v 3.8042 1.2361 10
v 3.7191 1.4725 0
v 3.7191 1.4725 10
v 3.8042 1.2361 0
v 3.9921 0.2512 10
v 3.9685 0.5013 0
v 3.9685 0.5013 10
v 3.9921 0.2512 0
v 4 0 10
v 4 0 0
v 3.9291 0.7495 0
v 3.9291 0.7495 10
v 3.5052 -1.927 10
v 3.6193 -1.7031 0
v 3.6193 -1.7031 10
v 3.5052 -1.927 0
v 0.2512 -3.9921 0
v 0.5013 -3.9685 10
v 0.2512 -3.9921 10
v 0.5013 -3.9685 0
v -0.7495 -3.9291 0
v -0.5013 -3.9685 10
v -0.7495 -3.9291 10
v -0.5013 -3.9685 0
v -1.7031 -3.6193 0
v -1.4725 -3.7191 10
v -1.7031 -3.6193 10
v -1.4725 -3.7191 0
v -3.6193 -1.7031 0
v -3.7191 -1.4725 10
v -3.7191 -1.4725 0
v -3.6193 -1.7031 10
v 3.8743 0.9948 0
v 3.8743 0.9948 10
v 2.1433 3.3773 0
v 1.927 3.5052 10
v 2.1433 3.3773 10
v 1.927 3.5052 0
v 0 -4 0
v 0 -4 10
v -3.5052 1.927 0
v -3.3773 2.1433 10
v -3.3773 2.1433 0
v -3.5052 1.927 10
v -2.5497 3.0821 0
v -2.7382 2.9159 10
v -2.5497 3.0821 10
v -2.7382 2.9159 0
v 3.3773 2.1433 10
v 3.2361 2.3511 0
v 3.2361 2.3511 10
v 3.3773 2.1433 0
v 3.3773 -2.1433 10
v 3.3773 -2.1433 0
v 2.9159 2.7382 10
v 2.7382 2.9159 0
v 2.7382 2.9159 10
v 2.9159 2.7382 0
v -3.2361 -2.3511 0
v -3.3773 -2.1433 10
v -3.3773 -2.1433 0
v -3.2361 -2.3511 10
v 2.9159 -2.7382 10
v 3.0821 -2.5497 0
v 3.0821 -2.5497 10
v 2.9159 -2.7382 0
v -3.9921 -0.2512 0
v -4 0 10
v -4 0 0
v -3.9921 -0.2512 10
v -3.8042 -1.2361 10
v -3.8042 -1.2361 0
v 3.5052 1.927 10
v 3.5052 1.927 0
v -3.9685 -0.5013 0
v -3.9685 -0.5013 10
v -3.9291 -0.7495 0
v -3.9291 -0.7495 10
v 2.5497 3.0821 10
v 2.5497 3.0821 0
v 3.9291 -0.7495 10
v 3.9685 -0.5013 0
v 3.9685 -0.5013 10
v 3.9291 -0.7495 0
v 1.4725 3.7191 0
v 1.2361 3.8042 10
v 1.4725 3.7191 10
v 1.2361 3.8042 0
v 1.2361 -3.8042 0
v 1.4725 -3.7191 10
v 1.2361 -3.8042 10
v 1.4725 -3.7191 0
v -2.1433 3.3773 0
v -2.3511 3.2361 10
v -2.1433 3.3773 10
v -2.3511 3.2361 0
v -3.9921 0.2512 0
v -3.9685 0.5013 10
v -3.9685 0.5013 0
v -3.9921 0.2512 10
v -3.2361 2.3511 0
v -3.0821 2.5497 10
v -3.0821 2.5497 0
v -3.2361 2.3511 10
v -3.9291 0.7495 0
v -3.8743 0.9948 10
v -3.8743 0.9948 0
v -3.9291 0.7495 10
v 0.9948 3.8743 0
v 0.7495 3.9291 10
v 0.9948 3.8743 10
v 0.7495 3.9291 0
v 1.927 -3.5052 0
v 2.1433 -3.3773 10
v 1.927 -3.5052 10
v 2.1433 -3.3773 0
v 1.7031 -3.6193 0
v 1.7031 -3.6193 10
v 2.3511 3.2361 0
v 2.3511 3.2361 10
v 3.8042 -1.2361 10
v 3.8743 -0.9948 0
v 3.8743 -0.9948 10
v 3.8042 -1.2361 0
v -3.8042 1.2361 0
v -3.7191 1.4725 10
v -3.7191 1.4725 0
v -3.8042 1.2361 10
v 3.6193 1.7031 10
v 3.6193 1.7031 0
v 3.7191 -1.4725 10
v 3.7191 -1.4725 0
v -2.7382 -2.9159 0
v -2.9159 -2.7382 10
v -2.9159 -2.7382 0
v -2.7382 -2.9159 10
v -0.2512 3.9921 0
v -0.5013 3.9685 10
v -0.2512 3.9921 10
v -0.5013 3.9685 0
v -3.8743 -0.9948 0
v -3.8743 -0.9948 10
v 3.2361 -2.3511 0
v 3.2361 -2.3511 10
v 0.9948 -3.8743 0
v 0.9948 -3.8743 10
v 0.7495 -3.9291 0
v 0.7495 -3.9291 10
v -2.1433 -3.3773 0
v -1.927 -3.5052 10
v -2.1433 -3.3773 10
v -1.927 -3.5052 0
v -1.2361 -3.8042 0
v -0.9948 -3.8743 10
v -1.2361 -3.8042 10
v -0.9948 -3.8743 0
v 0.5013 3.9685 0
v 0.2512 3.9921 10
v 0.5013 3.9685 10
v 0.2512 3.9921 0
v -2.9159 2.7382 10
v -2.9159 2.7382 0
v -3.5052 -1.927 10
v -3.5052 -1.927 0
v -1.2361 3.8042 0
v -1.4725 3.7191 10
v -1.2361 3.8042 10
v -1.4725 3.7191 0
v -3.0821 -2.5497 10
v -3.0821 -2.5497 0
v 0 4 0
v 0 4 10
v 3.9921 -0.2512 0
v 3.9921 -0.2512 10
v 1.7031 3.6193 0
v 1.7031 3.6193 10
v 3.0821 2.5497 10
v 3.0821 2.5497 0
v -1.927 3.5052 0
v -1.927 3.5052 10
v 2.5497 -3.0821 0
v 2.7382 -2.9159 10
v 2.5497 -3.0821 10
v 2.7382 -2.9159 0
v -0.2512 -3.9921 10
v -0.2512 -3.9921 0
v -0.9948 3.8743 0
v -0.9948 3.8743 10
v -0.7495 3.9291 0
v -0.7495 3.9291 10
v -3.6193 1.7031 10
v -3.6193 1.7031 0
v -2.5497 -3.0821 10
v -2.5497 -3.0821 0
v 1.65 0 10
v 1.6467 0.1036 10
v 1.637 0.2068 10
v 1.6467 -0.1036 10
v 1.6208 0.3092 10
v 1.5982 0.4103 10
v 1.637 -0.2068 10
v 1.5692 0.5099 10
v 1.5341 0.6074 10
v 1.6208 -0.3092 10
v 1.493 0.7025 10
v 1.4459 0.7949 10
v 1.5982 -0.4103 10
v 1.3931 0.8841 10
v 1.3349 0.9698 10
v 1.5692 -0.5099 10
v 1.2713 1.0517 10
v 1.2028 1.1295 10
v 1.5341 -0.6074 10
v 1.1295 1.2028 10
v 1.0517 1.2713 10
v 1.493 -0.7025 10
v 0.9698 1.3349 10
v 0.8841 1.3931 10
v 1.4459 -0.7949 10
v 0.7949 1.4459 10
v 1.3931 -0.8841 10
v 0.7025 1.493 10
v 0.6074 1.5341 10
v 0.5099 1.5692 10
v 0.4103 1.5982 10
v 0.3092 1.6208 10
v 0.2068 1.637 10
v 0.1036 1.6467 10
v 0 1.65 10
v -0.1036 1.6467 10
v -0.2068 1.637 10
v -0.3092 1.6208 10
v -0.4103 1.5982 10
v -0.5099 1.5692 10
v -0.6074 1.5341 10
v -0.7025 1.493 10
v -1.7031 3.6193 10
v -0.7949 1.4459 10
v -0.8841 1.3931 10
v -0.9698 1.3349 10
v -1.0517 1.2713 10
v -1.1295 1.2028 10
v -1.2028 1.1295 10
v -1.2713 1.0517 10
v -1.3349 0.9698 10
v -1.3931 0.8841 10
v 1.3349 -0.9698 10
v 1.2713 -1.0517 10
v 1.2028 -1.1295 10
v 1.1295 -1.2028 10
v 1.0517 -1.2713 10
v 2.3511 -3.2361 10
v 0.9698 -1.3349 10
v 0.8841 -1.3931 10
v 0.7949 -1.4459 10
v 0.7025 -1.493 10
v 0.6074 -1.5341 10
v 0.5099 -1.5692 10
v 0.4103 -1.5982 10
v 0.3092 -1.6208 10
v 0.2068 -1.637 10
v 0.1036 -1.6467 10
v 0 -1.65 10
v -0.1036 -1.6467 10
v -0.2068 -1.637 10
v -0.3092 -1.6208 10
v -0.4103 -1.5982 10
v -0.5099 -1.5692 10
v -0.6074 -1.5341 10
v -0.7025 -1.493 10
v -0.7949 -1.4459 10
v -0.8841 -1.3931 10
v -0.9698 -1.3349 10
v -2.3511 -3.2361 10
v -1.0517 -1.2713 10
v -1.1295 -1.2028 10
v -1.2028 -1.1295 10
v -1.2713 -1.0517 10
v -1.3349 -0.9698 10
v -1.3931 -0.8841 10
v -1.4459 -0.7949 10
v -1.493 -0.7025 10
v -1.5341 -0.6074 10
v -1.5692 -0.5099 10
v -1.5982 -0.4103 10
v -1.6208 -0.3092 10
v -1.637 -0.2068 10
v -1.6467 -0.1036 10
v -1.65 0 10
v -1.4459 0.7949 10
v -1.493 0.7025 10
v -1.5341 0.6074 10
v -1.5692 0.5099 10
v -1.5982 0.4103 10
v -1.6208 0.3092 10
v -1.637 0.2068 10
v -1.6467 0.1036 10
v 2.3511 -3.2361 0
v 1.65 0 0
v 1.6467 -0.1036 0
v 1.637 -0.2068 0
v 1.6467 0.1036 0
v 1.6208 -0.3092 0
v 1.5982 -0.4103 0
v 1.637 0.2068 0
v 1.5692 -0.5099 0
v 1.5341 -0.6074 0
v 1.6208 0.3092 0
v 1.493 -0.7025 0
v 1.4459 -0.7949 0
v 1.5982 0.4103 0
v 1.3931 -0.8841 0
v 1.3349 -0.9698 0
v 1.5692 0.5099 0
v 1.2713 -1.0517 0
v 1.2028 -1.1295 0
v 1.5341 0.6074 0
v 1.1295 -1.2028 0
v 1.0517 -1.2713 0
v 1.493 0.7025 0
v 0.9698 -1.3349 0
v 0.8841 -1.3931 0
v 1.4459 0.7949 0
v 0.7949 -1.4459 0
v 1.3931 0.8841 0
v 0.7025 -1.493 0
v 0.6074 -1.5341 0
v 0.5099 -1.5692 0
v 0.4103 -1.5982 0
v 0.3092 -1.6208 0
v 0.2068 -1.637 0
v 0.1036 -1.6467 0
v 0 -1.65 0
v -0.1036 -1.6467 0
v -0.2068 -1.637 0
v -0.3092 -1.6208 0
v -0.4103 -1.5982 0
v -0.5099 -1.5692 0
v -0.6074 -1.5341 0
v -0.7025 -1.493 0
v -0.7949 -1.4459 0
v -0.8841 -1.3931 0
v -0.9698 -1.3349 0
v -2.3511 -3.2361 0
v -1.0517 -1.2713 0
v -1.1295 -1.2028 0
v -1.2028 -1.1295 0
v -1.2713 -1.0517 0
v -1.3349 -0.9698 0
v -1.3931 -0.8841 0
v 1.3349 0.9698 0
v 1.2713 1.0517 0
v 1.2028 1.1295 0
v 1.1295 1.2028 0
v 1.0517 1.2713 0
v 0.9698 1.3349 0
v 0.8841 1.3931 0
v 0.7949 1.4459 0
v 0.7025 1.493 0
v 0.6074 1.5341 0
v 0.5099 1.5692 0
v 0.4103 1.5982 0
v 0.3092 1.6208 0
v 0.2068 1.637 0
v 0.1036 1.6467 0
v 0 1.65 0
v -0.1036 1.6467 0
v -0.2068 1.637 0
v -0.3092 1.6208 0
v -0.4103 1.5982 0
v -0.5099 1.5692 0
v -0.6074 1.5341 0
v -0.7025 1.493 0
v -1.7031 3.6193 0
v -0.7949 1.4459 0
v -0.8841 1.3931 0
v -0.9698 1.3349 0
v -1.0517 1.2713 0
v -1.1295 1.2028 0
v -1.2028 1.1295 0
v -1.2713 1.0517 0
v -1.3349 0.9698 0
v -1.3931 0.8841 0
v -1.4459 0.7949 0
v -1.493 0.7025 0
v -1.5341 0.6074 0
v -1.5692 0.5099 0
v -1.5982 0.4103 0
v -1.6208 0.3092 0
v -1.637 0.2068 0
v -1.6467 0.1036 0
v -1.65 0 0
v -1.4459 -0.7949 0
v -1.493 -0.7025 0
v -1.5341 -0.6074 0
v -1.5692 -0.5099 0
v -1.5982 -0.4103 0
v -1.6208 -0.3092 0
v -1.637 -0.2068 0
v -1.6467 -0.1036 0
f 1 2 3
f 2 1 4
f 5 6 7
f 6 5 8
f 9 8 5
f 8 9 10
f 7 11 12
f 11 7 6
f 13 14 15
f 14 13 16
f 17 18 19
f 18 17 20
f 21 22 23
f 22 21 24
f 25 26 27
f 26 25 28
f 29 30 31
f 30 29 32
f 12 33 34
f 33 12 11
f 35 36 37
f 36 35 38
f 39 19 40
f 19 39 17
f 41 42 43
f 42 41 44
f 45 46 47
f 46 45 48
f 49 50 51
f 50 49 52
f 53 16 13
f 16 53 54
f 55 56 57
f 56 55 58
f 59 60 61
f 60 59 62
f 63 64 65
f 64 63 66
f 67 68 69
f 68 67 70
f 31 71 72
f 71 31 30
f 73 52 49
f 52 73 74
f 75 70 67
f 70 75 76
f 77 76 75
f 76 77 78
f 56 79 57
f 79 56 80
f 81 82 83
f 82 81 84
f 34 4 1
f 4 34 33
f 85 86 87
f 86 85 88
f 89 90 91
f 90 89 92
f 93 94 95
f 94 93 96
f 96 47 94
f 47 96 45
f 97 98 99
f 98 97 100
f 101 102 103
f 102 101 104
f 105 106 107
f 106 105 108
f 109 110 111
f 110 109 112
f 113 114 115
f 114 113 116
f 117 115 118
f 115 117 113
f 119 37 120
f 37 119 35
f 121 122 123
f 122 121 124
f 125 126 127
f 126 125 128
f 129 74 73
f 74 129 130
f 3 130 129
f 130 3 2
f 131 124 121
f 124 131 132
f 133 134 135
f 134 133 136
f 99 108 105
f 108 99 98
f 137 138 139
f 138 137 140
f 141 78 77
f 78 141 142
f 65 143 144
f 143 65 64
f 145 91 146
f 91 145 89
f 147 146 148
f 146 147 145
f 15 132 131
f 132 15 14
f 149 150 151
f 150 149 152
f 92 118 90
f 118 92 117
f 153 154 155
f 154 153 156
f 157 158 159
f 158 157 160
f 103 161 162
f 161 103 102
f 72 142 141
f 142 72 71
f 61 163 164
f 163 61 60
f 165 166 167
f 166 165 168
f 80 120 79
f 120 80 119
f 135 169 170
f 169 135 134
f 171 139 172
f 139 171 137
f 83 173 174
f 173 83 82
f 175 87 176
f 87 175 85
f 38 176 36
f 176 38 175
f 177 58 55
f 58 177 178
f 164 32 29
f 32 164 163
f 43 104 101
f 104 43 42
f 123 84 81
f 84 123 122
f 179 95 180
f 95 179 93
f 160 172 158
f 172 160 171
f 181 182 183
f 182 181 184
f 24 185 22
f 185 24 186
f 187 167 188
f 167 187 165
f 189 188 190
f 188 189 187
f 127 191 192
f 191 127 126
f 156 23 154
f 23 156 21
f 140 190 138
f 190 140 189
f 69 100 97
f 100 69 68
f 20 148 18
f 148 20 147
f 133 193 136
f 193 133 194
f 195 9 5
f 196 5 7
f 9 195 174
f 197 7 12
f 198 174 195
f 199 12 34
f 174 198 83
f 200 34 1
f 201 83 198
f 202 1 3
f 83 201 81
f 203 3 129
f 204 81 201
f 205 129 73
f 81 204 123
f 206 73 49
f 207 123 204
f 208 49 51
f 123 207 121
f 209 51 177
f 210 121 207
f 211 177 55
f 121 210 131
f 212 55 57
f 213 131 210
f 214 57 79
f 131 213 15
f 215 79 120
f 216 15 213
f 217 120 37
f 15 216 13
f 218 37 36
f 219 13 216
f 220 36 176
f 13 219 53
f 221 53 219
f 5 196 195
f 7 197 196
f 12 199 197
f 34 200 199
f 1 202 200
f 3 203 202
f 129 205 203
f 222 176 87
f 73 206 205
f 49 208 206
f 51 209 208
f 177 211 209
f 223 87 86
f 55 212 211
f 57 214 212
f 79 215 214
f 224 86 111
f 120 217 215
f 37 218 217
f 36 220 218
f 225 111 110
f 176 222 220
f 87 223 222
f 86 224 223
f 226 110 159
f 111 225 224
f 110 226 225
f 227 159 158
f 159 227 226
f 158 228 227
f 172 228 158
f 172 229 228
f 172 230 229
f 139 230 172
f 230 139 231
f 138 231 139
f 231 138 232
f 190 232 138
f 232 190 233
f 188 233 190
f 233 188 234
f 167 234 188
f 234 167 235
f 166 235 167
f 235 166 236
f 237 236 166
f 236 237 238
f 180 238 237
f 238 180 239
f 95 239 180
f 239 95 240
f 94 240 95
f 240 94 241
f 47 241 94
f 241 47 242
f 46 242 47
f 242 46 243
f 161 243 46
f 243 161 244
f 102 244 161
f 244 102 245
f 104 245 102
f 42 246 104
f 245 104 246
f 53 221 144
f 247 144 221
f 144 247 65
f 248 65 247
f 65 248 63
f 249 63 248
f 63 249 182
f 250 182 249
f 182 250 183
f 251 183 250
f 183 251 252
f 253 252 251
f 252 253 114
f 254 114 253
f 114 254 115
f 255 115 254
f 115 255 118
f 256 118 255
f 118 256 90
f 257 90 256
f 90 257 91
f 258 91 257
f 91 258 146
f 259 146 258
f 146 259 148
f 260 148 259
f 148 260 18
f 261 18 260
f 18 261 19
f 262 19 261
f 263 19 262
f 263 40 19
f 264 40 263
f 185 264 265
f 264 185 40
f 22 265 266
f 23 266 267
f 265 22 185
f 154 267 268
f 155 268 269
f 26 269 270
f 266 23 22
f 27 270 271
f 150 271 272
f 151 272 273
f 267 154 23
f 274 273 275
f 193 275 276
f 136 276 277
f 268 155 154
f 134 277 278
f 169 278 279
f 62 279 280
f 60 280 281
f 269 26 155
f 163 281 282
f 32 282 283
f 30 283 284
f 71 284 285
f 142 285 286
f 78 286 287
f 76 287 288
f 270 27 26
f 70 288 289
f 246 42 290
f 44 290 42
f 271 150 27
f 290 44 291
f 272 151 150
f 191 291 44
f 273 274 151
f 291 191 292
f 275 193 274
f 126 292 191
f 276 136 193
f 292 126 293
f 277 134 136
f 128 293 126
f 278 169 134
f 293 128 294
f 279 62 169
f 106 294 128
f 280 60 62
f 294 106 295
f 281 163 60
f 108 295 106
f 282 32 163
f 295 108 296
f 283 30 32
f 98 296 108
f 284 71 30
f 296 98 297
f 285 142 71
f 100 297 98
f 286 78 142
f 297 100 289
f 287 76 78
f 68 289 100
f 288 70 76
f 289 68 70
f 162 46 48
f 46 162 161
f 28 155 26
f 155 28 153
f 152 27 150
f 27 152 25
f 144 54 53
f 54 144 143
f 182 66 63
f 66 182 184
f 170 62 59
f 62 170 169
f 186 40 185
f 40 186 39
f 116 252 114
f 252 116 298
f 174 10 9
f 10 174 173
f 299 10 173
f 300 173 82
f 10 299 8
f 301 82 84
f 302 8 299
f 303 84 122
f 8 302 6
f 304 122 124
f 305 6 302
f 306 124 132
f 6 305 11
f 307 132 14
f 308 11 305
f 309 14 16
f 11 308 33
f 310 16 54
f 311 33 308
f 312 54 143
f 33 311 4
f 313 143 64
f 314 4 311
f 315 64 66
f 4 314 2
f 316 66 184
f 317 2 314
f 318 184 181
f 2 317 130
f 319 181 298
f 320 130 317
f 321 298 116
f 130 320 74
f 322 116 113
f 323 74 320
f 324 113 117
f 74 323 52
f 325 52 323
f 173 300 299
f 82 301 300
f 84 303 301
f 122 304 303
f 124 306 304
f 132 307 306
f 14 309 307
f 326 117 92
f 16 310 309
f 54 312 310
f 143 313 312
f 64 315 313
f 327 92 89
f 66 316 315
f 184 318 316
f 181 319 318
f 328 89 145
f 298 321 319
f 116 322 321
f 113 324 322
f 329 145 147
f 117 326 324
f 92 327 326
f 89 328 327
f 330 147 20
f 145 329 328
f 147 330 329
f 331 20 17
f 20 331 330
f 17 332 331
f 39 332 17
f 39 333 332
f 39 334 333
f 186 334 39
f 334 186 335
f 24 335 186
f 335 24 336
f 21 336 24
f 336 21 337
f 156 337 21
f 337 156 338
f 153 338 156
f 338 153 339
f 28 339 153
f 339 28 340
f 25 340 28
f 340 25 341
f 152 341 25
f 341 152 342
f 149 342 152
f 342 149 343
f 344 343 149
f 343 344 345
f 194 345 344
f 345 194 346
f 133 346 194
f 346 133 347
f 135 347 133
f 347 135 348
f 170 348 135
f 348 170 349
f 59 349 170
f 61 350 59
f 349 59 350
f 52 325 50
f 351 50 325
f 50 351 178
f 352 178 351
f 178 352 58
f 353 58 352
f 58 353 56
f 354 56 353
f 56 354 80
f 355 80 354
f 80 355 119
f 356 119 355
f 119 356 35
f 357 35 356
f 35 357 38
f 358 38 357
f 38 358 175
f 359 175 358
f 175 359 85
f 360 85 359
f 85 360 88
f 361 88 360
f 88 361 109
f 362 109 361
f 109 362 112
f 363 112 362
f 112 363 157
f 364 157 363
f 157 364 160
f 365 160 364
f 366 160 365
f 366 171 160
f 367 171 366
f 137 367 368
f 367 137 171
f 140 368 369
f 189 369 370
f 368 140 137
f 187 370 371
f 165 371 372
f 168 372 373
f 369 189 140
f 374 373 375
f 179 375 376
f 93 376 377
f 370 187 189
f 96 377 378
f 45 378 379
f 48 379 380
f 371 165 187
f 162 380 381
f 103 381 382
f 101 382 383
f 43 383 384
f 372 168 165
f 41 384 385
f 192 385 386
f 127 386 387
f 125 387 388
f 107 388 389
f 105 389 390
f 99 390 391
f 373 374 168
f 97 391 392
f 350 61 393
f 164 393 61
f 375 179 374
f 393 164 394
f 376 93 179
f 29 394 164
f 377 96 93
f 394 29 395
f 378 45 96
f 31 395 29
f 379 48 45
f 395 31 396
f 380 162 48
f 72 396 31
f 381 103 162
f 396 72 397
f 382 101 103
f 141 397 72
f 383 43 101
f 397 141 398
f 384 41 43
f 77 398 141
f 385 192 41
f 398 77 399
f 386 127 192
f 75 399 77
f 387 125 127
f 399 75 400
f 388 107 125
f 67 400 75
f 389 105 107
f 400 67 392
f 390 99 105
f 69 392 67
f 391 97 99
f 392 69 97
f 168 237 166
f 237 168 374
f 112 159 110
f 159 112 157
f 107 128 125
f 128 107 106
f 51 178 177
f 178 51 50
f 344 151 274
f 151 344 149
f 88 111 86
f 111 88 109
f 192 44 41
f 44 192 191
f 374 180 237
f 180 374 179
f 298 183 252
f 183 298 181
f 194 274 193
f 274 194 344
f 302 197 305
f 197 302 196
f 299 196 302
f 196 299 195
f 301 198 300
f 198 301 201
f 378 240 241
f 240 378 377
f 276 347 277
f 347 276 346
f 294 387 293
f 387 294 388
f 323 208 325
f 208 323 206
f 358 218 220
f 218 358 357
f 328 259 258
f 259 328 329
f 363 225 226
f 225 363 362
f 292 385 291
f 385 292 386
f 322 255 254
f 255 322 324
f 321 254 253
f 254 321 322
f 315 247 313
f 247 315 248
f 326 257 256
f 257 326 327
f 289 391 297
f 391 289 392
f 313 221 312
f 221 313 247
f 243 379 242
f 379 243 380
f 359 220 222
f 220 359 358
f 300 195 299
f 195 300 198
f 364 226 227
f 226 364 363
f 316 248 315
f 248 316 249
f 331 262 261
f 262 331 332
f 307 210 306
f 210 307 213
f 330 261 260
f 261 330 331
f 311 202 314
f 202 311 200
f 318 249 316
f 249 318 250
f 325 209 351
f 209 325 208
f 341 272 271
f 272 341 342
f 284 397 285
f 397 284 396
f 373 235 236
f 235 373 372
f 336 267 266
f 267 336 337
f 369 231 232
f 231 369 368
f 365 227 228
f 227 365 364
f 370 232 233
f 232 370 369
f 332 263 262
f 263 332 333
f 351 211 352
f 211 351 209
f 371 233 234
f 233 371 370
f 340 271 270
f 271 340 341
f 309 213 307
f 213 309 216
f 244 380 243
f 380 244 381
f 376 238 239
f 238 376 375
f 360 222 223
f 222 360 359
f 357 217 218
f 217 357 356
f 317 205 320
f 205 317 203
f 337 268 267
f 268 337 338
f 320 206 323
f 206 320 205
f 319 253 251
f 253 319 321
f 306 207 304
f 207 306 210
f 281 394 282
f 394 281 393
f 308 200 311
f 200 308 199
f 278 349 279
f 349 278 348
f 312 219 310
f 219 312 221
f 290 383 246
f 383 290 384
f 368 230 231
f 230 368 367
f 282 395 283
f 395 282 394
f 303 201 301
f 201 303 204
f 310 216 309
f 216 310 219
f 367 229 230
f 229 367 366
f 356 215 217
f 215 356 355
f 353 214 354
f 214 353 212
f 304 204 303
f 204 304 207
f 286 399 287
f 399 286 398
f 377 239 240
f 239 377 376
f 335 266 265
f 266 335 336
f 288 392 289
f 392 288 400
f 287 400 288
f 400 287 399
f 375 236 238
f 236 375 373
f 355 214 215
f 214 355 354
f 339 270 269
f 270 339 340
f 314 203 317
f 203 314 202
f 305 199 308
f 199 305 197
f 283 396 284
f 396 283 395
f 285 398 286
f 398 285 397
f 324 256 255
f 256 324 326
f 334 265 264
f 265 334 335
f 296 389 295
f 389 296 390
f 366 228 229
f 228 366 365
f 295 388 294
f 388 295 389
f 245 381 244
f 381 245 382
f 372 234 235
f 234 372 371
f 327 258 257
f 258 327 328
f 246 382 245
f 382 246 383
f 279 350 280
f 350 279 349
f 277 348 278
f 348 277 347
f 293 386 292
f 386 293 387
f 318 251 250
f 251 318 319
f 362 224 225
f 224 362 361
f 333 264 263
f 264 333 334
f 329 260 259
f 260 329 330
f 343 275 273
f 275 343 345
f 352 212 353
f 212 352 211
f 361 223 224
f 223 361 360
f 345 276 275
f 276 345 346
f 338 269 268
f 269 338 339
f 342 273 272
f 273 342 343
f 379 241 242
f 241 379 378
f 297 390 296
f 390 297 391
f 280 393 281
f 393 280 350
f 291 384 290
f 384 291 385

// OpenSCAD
//simple pcb standoff library - By the DoomMeister
/* Types will be through hole, captured nut, split column (with and without base)
v1 - First Release
v1.1 - Tidied Split Base
v1.2 - added support for end nut
//Released under the terms of the GNU GPL v3.0
This program is free software: you can redistribute it and/or modify
it under the terms of the GNU General Public License as published by
the Free Software Foundation, either version 3 of the License, or
(at your option) any later version.

This program is distributed in the hope that it will be useful,
but WITHOUT ANY WARRANTY; without even the implied warranty of
MERCHANTABILITY or FITNESS FOR A PARTICULAR PURPOSE. See the
GNU General Public License for more details.

You should have received a copy of the GNU General Public License
along with this program. If not, see <http://www.gnu.org/licenses/>.
*/
include<MCAD/metric_fastners.scad>

//>>>>>>>>>>>>>>>>>>>>>>>>>>>>>>>>>>>>>>>>>>>>>>>>>>>>>>>>>>>>>>>>>>>>>>>>>>>
//usage
//>>>>>>>>>>>>>>>>>>>>>>>>>>>>>>>>>>>>>>>>>>>>>>>>>>>>>>>>>>>>>>>>>>>>>>>>>>>
/*
pcb_stand_off(
				type="plain",  THIS IS THE TYPE OF STAND OFF plain, end_nut, split_base 
				hex=true, 		THIS IS THE OUTSIDE SHAPE IS IT HEXAGONAL OR ROUND,NOT USED ON SPLIT TYPE
				od = 10, 		OUTSIDE DIAMETER
				id = 3,        THREAD SIZE FOR INNER DIAMETER, HOLE SIZE FOR SPLIT TYPE
				len = 12, 		LENGTH, SUPPORT HEIGHT FOR SPLIT TYPE
				cl=0.3,  		CLEARANCE
				thk_base,		BASE THICKNESS FOR SPLIT TYPE
				thk_pcb);		PCB THICKNESS


*/
//>>>>>>>>>>>>>>>>>>>>>>>>>>>>>>>>>>>>>>>>>>>>>>>>>>>>>>>>>>>>>>>>>>>>>>>>>>>
//Customiser Stuff - Comment out to use as libray
//>>>>>>>>>>>>>>>>>>>>>>>>>>>>>>>>>>>>>>>>>>>>>>>>>>>>>>>>>>>>>>>>>>>>>>>>>>>
//Setup
///*
//Plain, Retained Nut or Split Pillar With Base
Stand_Off_Type = "plain"; // [plain,end_nut,split_base]
//Round or Hex Outside
Hexagon = "false"; //[false,true]
//Outside or Base Diameter
Outside_Diameter = 8;
//Thread Size (metric ) or hole size (Split Type)
Inside_Diameter = 3;
//Length or PCB Spaceing
Length = 10;
//
Clearance = 0.3;
//(split type only)
Base_Thickness = 1.5;
//(split type only)
PCB_Thickness = 1.5;



//Thing
pcb_stand_off(type=Stand_Off_Type,hex=Hexagon, od = Outside_Diameter, id = Inside_Diameter, len = Length, cl=Clearance, thk_base=Base_Thickness,thk_pcb=PCB_Thickness);

//*/
//>>>>>>>>>>>>>>>>>>>>>>>>>>>>>>>>>>>>>>>>>>>>>>>>>>>>>>>>>>>>>>>>>>>>>>>>>>>
//draw test - comment this out for library use
//>>>>>>>>>>>>>>>>>>>>>>>>>>>>>>>>>>>>>>>>>>>>>>>>>>>>>>>>>>>>>>>>>>>>>>>>>>>
/*
spaceing = 15*1;
translate([0*spaceing,0*spaceing,0])color("red")pcb_stand_off(type="plain",hex=true, od = 10, id = 3, len = 12, cl=0.3,thk_base=3,thk_pcb=1.5);
translate([1*spaceing,0*spaceing,0])color("green")pcb_stand_off(type="end_nut",hex=false, od = 10, id = 3, len = 12, cl=0.3);
translate([1*spaceing,1*spaceing,0])color("blue")pcb_stand_off(type="split_base", od = 10, id = 3, len = 8, cl=0.3, thk_base=1.5,thk_pcb=1.5);
*/
//>>>>>>>>>>>>>>>>>>>>>>>>>>>>>>>>>>>>>>>>>>>>>>>>>>>>>>>>>>>>>>>>>>>>>>>>>>>
//outer module
//>>>>>>>>>>>>>>>>>>>>>>>>>>>>>>>>>>>>>>>>>>>>>>>>>>>>>>>>>>>>>>>>>>>>>>>>>>>

module pcb_stand_off(type="plain",hex=false, od = 2, id = 3, len = 8, cl=0.3,thk_base=3,thk_pcb=1.5)
{
if (type=="plain")
	{
		if (hex=="false")
			{
				stand_off(_od=od, _id = id,_len = len,_cl = cl);
			}
		if (hex=="true")
			{
				stand_off_hex(_od=od, _id = id,_len = len,_cl = cl);
			}
	}
if (type=="end_nut")
	{
		if (hex=="false")
			{
				end_nut_stand_off(_od=od, _id = id,_len = len,_cl = cl);
			}
		if (hex=="true")
			{
				end_nut_stand_off_hex(_od=od, _id = id,_len = len,_cl = cl);
			}
	}
if (type=="split_base")
	{

				split_base_stand_off(_od=od, _id = id,_len = len,_cl = cl,_thk_base=thk_base,_thk_pcb=thk_pcb);


	}
}

//>>>>>>>>>>>>>>>>>>>>>>>>>>>>>>>>>>>>>>>>>>>>>>>>>>>>>>>>>>>>>>>>>>>>>>>>>>>
//inner modules
//>>>>>>>>>>>>>>>>>>>>>>>>>>>>>>>>>>>>>>>>>>>>>>>>>>>>>>>>>>>>>>>>>>>>>>>>>>>

module end_nut_stand_off(_od=2, _id = 2,_len = 8,_cl = 0.3)
{
	union()
	{
	difference(){
		cylinder(r = _od/2, h = _len, $fn=100);
		translate([0,0,-1])cylinder(r = (_id + _cl)/2, h = _len+2, $fn=100);
		translate([0,0,0])flat_nut(_id+_cl,apply_chamfer=false);
		translate([0,0,_len-(0.8*(_id+_cl))+.01])flat_nut(_id+_cl,apply_chamfer=false);
		}
		translate([0,0,(0.8*(_id+_cl))])cylinder(r = _od/2, h = 0.25, $fn=100);
	}
}
module end_nut_stand_off_hex(_od=2, _id = 2,_len = 8,_cl = 0.3)
{
	union()
	{
	difference(){
		cylinder(r = _od/2, h = _len, $fn=6);
		translate([0,0,-1])cylinder(r = (_id + _cl)/2, h = _len+2, $fn=100);
		translate([0,0,0])flat_nut(_id+_cl,apply_chamfer=false);
		translate([0,0,_len-(0.8*(_id+_cl))+.01])flat_nut(_id+_cl,apply_chamfer=false);
		}
		translate([0,0,(0.8*(_id+_cl))])cylinder(r = _od/2, h = 0.25, $fn=6);
	}
}
module stand_off(_od=2, _id = 2,_len = 8,_cl = 0.3)
{
	difference(){
		cylinder(r = _od/2, h = _len, $fn=100);
		translate([0,0,-1])cylinder(r = (_id + _cl)/2, h = _len+2, $fn=100);
	}
}

module stand_off_hex(_od=2, _id = 2,_len = 8,_cl = 0.3)
{
	difference(){
		cylinder(r = _od/2, h = _len, $fn=6);
		translate([0,0,-1])cylinder(r = (_id + _cl)/2, h = _len+2, $fn=100);

	}
}

module split_base_stand_off(_od=12, _id = 2,_len = 8,_cl = 0.3,_thk_base=3,_thk_pcb=1.5)
{
	//tunables
	_top_len = 3;
	_sup_d = 2;
	_sup_ang = 30;
	//extra calcs
	_split_w=_id/3;
	_ol_len = _len+_thk_pcb+_top_len+(2*_cl);
	_sup_len = ((_sup_d/2)/tan(_sup_ang));
	_pil_d = (_id-_cl)/2;
	echo(_sup_len);
	difference(){
		union()
		{
			cylinder(r = _od/2, h = _thk_base, $fn=100);
			cylinder(r = _pil_d, h = _ol_len, $fn=100);
			translate([0,0,_len-_sup_len])cylinder(r1 = _pil_d, r2 = (_id+_sup_d)/2, h = _sup_len, $fn=100);
			translate([0,0,_len+_thk_pcb+(_cl)])cylinder(r1 = _pil_d, r2 = (_id+(1.1*_cl))/2, h = _cl, $fn=100);
			translate([0,0,_len+_thk_pcb+(2*_cl)])cylinder(r1 = (_id+(1.1*_cl))/2, r2 = _pil_d, h = _top_len, $fn=100);
		}
			
			translate([-(_id+_sup_d)/2,-_split_w/2,_len-_sup_len+_split_w])
				cube([_id+_sup_d,_split_w,_sup_len+_thk_pcb+_top_len+_cl]);
			translate([-(_id+_sup_d)/2,0,_len-_sup_len+_split_w])
			 rotate([0,90,0])
				cylinder(r=_split_w/2, h=_id+_sup_d, $fn=100);		
}
}
